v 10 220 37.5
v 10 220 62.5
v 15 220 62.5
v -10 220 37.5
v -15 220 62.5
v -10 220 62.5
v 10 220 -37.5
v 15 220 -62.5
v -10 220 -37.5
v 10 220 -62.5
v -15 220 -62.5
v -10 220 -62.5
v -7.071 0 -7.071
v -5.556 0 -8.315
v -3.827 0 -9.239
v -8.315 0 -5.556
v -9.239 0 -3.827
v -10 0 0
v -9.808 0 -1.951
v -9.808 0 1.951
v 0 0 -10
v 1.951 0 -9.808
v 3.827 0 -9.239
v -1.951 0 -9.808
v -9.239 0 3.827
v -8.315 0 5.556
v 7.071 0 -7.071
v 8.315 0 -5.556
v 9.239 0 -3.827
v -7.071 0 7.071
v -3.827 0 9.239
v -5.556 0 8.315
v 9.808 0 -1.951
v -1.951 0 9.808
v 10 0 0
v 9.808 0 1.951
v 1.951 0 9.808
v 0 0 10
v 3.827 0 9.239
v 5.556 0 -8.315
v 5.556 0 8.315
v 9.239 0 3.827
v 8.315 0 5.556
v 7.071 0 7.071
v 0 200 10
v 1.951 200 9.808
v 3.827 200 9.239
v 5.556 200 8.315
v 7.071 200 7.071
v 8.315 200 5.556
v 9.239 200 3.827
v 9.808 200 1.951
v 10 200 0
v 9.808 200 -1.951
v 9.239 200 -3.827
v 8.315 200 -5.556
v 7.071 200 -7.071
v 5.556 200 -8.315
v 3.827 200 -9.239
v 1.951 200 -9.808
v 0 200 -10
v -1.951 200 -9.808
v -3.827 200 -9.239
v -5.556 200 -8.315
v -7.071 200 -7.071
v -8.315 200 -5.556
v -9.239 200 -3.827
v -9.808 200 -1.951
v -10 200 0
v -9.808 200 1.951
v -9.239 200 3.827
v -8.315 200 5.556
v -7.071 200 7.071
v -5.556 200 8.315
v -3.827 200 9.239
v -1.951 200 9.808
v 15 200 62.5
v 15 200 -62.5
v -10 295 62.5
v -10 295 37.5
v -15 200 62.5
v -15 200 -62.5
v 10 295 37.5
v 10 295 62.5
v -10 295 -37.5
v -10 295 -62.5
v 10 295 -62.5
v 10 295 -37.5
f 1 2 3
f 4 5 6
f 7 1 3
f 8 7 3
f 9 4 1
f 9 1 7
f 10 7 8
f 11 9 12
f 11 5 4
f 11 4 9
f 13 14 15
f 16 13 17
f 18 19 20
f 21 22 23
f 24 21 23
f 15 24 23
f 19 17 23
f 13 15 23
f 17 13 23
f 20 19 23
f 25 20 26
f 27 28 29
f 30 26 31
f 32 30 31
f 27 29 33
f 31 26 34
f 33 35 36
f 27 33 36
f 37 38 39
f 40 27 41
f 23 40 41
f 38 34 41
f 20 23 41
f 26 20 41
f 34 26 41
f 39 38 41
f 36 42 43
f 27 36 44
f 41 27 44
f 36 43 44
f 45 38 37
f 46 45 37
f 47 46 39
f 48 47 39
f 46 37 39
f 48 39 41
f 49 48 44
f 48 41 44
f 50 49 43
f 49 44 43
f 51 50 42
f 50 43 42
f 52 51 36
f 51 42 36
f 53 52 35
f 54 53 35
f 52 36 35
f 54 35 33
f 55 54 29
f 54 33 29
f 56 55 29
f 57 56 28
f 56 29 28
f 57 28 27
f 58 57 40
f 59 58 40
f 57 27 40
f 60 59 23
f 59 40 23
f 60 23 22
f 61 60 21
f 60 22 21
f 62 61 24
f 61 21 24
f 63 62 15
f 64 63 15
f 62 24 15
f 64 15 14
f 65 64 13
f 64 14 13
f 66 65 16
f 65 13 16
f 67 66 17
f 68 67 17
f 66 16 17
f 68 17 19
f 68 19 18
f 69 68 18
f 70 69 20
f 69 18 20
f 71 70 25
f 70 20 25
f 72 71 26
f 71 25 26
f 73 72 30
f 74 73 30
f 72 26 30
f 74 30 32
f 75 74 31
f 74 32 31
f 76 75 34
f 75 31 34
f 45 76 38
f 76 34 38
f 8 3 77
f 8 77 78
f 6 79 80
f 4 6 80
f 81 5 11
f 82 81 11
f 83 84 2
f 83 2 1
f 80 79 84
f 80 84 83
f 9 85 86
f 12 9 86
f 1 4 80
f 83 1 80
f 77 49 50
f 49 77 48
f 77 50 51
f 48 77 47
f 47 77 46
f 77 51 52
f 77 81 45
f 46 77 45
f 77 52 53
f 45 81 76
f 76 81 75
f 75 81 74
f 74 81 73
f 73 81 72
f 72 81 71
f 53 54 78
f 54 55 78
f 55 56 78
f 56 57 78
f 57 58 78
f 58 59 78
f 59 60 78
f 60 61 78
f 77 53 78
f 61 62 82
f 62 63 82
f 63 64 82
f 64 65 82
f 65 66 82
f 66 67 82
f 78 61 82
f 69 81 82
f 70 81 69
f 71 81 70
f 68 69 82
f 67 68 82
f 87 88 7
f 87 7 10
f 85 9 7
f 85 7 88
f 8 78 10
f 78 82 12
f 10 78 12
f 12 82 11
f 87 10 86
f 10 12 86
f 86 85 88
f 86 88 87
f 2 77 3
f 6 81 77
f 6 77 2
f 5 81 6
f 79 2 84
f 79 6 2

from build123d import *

# Parameters (mm, degrees)
SKETCH1_R                = 10
BOSS_EXTRUDE1_DEPTH      = 200
BOSS_EXTRUDE2_DEPTH      = 15
BOSS_EXTRUDE2_DEPTH_BACK = 15
SKETCH2_W                = 125
SKETCH2_H                = 20
BOSS_EXTRUDE3_DEPTH      = 10
BOSS_EXTRUDE3_DEPTH_BACK = 10
SKETCH3_W                = 25
SKETCH3_H                = 75


with BuildPart() as part:
    # Sketch1 → Boss-Extrude1 (new body)
    with BuildSketch(Plane(origin=(0, 0, 0), x_dir=(1, 0, 0), z_dir=(0, 1, 0))):
        Circle(SKETCH1_R)
    extrude(amount=BOSS_EXTRUDE1_DEPTH)

    # Sketch2 → Boss-Extrude2 (add, two sides: drawn at the far end of the back side and taken through both)
    with BuildSketch(Plane(origin=(0, 0, 0), x_dir=(0, 0, -1), z_dir=(1, 0, 0)).offset(-BOSS_EXTRUDE2_DEPTH_BACK)):
        with Locations((0, 210)):
            Rectangle(SKETCH2_W, SKETCH2_H)
    extrude(amount=BOSS_EXTRUDE2_DEPTH + BOSS_EXTRUDE2_DEPTH_BACK)

    # Sketch3 → Boss-Extrude3 (add, two sides: drawn at the far end of the back side and taken through both)
    with BuildSketch(Plane(origin=(0, 0, 0), x_dir=(0, 0, -1), z_dir=(1, 0, 0)).offset(-BOSS_EXTRUDE3_DEPTH_BACK)):
        with Locations((-50, 257.5)):
            Rectangle(SKETCH3_W, SKETCH3_H)
        with Locations((50, 257.5)):
            Rectangle(SKETCH3_W, SKETCH3_H)
    extrude(amount=BOSS_EXTRUDE3_DEPTH + BOSS_EXTRUDE3_DEPTH_BACK)


solid = part.part
